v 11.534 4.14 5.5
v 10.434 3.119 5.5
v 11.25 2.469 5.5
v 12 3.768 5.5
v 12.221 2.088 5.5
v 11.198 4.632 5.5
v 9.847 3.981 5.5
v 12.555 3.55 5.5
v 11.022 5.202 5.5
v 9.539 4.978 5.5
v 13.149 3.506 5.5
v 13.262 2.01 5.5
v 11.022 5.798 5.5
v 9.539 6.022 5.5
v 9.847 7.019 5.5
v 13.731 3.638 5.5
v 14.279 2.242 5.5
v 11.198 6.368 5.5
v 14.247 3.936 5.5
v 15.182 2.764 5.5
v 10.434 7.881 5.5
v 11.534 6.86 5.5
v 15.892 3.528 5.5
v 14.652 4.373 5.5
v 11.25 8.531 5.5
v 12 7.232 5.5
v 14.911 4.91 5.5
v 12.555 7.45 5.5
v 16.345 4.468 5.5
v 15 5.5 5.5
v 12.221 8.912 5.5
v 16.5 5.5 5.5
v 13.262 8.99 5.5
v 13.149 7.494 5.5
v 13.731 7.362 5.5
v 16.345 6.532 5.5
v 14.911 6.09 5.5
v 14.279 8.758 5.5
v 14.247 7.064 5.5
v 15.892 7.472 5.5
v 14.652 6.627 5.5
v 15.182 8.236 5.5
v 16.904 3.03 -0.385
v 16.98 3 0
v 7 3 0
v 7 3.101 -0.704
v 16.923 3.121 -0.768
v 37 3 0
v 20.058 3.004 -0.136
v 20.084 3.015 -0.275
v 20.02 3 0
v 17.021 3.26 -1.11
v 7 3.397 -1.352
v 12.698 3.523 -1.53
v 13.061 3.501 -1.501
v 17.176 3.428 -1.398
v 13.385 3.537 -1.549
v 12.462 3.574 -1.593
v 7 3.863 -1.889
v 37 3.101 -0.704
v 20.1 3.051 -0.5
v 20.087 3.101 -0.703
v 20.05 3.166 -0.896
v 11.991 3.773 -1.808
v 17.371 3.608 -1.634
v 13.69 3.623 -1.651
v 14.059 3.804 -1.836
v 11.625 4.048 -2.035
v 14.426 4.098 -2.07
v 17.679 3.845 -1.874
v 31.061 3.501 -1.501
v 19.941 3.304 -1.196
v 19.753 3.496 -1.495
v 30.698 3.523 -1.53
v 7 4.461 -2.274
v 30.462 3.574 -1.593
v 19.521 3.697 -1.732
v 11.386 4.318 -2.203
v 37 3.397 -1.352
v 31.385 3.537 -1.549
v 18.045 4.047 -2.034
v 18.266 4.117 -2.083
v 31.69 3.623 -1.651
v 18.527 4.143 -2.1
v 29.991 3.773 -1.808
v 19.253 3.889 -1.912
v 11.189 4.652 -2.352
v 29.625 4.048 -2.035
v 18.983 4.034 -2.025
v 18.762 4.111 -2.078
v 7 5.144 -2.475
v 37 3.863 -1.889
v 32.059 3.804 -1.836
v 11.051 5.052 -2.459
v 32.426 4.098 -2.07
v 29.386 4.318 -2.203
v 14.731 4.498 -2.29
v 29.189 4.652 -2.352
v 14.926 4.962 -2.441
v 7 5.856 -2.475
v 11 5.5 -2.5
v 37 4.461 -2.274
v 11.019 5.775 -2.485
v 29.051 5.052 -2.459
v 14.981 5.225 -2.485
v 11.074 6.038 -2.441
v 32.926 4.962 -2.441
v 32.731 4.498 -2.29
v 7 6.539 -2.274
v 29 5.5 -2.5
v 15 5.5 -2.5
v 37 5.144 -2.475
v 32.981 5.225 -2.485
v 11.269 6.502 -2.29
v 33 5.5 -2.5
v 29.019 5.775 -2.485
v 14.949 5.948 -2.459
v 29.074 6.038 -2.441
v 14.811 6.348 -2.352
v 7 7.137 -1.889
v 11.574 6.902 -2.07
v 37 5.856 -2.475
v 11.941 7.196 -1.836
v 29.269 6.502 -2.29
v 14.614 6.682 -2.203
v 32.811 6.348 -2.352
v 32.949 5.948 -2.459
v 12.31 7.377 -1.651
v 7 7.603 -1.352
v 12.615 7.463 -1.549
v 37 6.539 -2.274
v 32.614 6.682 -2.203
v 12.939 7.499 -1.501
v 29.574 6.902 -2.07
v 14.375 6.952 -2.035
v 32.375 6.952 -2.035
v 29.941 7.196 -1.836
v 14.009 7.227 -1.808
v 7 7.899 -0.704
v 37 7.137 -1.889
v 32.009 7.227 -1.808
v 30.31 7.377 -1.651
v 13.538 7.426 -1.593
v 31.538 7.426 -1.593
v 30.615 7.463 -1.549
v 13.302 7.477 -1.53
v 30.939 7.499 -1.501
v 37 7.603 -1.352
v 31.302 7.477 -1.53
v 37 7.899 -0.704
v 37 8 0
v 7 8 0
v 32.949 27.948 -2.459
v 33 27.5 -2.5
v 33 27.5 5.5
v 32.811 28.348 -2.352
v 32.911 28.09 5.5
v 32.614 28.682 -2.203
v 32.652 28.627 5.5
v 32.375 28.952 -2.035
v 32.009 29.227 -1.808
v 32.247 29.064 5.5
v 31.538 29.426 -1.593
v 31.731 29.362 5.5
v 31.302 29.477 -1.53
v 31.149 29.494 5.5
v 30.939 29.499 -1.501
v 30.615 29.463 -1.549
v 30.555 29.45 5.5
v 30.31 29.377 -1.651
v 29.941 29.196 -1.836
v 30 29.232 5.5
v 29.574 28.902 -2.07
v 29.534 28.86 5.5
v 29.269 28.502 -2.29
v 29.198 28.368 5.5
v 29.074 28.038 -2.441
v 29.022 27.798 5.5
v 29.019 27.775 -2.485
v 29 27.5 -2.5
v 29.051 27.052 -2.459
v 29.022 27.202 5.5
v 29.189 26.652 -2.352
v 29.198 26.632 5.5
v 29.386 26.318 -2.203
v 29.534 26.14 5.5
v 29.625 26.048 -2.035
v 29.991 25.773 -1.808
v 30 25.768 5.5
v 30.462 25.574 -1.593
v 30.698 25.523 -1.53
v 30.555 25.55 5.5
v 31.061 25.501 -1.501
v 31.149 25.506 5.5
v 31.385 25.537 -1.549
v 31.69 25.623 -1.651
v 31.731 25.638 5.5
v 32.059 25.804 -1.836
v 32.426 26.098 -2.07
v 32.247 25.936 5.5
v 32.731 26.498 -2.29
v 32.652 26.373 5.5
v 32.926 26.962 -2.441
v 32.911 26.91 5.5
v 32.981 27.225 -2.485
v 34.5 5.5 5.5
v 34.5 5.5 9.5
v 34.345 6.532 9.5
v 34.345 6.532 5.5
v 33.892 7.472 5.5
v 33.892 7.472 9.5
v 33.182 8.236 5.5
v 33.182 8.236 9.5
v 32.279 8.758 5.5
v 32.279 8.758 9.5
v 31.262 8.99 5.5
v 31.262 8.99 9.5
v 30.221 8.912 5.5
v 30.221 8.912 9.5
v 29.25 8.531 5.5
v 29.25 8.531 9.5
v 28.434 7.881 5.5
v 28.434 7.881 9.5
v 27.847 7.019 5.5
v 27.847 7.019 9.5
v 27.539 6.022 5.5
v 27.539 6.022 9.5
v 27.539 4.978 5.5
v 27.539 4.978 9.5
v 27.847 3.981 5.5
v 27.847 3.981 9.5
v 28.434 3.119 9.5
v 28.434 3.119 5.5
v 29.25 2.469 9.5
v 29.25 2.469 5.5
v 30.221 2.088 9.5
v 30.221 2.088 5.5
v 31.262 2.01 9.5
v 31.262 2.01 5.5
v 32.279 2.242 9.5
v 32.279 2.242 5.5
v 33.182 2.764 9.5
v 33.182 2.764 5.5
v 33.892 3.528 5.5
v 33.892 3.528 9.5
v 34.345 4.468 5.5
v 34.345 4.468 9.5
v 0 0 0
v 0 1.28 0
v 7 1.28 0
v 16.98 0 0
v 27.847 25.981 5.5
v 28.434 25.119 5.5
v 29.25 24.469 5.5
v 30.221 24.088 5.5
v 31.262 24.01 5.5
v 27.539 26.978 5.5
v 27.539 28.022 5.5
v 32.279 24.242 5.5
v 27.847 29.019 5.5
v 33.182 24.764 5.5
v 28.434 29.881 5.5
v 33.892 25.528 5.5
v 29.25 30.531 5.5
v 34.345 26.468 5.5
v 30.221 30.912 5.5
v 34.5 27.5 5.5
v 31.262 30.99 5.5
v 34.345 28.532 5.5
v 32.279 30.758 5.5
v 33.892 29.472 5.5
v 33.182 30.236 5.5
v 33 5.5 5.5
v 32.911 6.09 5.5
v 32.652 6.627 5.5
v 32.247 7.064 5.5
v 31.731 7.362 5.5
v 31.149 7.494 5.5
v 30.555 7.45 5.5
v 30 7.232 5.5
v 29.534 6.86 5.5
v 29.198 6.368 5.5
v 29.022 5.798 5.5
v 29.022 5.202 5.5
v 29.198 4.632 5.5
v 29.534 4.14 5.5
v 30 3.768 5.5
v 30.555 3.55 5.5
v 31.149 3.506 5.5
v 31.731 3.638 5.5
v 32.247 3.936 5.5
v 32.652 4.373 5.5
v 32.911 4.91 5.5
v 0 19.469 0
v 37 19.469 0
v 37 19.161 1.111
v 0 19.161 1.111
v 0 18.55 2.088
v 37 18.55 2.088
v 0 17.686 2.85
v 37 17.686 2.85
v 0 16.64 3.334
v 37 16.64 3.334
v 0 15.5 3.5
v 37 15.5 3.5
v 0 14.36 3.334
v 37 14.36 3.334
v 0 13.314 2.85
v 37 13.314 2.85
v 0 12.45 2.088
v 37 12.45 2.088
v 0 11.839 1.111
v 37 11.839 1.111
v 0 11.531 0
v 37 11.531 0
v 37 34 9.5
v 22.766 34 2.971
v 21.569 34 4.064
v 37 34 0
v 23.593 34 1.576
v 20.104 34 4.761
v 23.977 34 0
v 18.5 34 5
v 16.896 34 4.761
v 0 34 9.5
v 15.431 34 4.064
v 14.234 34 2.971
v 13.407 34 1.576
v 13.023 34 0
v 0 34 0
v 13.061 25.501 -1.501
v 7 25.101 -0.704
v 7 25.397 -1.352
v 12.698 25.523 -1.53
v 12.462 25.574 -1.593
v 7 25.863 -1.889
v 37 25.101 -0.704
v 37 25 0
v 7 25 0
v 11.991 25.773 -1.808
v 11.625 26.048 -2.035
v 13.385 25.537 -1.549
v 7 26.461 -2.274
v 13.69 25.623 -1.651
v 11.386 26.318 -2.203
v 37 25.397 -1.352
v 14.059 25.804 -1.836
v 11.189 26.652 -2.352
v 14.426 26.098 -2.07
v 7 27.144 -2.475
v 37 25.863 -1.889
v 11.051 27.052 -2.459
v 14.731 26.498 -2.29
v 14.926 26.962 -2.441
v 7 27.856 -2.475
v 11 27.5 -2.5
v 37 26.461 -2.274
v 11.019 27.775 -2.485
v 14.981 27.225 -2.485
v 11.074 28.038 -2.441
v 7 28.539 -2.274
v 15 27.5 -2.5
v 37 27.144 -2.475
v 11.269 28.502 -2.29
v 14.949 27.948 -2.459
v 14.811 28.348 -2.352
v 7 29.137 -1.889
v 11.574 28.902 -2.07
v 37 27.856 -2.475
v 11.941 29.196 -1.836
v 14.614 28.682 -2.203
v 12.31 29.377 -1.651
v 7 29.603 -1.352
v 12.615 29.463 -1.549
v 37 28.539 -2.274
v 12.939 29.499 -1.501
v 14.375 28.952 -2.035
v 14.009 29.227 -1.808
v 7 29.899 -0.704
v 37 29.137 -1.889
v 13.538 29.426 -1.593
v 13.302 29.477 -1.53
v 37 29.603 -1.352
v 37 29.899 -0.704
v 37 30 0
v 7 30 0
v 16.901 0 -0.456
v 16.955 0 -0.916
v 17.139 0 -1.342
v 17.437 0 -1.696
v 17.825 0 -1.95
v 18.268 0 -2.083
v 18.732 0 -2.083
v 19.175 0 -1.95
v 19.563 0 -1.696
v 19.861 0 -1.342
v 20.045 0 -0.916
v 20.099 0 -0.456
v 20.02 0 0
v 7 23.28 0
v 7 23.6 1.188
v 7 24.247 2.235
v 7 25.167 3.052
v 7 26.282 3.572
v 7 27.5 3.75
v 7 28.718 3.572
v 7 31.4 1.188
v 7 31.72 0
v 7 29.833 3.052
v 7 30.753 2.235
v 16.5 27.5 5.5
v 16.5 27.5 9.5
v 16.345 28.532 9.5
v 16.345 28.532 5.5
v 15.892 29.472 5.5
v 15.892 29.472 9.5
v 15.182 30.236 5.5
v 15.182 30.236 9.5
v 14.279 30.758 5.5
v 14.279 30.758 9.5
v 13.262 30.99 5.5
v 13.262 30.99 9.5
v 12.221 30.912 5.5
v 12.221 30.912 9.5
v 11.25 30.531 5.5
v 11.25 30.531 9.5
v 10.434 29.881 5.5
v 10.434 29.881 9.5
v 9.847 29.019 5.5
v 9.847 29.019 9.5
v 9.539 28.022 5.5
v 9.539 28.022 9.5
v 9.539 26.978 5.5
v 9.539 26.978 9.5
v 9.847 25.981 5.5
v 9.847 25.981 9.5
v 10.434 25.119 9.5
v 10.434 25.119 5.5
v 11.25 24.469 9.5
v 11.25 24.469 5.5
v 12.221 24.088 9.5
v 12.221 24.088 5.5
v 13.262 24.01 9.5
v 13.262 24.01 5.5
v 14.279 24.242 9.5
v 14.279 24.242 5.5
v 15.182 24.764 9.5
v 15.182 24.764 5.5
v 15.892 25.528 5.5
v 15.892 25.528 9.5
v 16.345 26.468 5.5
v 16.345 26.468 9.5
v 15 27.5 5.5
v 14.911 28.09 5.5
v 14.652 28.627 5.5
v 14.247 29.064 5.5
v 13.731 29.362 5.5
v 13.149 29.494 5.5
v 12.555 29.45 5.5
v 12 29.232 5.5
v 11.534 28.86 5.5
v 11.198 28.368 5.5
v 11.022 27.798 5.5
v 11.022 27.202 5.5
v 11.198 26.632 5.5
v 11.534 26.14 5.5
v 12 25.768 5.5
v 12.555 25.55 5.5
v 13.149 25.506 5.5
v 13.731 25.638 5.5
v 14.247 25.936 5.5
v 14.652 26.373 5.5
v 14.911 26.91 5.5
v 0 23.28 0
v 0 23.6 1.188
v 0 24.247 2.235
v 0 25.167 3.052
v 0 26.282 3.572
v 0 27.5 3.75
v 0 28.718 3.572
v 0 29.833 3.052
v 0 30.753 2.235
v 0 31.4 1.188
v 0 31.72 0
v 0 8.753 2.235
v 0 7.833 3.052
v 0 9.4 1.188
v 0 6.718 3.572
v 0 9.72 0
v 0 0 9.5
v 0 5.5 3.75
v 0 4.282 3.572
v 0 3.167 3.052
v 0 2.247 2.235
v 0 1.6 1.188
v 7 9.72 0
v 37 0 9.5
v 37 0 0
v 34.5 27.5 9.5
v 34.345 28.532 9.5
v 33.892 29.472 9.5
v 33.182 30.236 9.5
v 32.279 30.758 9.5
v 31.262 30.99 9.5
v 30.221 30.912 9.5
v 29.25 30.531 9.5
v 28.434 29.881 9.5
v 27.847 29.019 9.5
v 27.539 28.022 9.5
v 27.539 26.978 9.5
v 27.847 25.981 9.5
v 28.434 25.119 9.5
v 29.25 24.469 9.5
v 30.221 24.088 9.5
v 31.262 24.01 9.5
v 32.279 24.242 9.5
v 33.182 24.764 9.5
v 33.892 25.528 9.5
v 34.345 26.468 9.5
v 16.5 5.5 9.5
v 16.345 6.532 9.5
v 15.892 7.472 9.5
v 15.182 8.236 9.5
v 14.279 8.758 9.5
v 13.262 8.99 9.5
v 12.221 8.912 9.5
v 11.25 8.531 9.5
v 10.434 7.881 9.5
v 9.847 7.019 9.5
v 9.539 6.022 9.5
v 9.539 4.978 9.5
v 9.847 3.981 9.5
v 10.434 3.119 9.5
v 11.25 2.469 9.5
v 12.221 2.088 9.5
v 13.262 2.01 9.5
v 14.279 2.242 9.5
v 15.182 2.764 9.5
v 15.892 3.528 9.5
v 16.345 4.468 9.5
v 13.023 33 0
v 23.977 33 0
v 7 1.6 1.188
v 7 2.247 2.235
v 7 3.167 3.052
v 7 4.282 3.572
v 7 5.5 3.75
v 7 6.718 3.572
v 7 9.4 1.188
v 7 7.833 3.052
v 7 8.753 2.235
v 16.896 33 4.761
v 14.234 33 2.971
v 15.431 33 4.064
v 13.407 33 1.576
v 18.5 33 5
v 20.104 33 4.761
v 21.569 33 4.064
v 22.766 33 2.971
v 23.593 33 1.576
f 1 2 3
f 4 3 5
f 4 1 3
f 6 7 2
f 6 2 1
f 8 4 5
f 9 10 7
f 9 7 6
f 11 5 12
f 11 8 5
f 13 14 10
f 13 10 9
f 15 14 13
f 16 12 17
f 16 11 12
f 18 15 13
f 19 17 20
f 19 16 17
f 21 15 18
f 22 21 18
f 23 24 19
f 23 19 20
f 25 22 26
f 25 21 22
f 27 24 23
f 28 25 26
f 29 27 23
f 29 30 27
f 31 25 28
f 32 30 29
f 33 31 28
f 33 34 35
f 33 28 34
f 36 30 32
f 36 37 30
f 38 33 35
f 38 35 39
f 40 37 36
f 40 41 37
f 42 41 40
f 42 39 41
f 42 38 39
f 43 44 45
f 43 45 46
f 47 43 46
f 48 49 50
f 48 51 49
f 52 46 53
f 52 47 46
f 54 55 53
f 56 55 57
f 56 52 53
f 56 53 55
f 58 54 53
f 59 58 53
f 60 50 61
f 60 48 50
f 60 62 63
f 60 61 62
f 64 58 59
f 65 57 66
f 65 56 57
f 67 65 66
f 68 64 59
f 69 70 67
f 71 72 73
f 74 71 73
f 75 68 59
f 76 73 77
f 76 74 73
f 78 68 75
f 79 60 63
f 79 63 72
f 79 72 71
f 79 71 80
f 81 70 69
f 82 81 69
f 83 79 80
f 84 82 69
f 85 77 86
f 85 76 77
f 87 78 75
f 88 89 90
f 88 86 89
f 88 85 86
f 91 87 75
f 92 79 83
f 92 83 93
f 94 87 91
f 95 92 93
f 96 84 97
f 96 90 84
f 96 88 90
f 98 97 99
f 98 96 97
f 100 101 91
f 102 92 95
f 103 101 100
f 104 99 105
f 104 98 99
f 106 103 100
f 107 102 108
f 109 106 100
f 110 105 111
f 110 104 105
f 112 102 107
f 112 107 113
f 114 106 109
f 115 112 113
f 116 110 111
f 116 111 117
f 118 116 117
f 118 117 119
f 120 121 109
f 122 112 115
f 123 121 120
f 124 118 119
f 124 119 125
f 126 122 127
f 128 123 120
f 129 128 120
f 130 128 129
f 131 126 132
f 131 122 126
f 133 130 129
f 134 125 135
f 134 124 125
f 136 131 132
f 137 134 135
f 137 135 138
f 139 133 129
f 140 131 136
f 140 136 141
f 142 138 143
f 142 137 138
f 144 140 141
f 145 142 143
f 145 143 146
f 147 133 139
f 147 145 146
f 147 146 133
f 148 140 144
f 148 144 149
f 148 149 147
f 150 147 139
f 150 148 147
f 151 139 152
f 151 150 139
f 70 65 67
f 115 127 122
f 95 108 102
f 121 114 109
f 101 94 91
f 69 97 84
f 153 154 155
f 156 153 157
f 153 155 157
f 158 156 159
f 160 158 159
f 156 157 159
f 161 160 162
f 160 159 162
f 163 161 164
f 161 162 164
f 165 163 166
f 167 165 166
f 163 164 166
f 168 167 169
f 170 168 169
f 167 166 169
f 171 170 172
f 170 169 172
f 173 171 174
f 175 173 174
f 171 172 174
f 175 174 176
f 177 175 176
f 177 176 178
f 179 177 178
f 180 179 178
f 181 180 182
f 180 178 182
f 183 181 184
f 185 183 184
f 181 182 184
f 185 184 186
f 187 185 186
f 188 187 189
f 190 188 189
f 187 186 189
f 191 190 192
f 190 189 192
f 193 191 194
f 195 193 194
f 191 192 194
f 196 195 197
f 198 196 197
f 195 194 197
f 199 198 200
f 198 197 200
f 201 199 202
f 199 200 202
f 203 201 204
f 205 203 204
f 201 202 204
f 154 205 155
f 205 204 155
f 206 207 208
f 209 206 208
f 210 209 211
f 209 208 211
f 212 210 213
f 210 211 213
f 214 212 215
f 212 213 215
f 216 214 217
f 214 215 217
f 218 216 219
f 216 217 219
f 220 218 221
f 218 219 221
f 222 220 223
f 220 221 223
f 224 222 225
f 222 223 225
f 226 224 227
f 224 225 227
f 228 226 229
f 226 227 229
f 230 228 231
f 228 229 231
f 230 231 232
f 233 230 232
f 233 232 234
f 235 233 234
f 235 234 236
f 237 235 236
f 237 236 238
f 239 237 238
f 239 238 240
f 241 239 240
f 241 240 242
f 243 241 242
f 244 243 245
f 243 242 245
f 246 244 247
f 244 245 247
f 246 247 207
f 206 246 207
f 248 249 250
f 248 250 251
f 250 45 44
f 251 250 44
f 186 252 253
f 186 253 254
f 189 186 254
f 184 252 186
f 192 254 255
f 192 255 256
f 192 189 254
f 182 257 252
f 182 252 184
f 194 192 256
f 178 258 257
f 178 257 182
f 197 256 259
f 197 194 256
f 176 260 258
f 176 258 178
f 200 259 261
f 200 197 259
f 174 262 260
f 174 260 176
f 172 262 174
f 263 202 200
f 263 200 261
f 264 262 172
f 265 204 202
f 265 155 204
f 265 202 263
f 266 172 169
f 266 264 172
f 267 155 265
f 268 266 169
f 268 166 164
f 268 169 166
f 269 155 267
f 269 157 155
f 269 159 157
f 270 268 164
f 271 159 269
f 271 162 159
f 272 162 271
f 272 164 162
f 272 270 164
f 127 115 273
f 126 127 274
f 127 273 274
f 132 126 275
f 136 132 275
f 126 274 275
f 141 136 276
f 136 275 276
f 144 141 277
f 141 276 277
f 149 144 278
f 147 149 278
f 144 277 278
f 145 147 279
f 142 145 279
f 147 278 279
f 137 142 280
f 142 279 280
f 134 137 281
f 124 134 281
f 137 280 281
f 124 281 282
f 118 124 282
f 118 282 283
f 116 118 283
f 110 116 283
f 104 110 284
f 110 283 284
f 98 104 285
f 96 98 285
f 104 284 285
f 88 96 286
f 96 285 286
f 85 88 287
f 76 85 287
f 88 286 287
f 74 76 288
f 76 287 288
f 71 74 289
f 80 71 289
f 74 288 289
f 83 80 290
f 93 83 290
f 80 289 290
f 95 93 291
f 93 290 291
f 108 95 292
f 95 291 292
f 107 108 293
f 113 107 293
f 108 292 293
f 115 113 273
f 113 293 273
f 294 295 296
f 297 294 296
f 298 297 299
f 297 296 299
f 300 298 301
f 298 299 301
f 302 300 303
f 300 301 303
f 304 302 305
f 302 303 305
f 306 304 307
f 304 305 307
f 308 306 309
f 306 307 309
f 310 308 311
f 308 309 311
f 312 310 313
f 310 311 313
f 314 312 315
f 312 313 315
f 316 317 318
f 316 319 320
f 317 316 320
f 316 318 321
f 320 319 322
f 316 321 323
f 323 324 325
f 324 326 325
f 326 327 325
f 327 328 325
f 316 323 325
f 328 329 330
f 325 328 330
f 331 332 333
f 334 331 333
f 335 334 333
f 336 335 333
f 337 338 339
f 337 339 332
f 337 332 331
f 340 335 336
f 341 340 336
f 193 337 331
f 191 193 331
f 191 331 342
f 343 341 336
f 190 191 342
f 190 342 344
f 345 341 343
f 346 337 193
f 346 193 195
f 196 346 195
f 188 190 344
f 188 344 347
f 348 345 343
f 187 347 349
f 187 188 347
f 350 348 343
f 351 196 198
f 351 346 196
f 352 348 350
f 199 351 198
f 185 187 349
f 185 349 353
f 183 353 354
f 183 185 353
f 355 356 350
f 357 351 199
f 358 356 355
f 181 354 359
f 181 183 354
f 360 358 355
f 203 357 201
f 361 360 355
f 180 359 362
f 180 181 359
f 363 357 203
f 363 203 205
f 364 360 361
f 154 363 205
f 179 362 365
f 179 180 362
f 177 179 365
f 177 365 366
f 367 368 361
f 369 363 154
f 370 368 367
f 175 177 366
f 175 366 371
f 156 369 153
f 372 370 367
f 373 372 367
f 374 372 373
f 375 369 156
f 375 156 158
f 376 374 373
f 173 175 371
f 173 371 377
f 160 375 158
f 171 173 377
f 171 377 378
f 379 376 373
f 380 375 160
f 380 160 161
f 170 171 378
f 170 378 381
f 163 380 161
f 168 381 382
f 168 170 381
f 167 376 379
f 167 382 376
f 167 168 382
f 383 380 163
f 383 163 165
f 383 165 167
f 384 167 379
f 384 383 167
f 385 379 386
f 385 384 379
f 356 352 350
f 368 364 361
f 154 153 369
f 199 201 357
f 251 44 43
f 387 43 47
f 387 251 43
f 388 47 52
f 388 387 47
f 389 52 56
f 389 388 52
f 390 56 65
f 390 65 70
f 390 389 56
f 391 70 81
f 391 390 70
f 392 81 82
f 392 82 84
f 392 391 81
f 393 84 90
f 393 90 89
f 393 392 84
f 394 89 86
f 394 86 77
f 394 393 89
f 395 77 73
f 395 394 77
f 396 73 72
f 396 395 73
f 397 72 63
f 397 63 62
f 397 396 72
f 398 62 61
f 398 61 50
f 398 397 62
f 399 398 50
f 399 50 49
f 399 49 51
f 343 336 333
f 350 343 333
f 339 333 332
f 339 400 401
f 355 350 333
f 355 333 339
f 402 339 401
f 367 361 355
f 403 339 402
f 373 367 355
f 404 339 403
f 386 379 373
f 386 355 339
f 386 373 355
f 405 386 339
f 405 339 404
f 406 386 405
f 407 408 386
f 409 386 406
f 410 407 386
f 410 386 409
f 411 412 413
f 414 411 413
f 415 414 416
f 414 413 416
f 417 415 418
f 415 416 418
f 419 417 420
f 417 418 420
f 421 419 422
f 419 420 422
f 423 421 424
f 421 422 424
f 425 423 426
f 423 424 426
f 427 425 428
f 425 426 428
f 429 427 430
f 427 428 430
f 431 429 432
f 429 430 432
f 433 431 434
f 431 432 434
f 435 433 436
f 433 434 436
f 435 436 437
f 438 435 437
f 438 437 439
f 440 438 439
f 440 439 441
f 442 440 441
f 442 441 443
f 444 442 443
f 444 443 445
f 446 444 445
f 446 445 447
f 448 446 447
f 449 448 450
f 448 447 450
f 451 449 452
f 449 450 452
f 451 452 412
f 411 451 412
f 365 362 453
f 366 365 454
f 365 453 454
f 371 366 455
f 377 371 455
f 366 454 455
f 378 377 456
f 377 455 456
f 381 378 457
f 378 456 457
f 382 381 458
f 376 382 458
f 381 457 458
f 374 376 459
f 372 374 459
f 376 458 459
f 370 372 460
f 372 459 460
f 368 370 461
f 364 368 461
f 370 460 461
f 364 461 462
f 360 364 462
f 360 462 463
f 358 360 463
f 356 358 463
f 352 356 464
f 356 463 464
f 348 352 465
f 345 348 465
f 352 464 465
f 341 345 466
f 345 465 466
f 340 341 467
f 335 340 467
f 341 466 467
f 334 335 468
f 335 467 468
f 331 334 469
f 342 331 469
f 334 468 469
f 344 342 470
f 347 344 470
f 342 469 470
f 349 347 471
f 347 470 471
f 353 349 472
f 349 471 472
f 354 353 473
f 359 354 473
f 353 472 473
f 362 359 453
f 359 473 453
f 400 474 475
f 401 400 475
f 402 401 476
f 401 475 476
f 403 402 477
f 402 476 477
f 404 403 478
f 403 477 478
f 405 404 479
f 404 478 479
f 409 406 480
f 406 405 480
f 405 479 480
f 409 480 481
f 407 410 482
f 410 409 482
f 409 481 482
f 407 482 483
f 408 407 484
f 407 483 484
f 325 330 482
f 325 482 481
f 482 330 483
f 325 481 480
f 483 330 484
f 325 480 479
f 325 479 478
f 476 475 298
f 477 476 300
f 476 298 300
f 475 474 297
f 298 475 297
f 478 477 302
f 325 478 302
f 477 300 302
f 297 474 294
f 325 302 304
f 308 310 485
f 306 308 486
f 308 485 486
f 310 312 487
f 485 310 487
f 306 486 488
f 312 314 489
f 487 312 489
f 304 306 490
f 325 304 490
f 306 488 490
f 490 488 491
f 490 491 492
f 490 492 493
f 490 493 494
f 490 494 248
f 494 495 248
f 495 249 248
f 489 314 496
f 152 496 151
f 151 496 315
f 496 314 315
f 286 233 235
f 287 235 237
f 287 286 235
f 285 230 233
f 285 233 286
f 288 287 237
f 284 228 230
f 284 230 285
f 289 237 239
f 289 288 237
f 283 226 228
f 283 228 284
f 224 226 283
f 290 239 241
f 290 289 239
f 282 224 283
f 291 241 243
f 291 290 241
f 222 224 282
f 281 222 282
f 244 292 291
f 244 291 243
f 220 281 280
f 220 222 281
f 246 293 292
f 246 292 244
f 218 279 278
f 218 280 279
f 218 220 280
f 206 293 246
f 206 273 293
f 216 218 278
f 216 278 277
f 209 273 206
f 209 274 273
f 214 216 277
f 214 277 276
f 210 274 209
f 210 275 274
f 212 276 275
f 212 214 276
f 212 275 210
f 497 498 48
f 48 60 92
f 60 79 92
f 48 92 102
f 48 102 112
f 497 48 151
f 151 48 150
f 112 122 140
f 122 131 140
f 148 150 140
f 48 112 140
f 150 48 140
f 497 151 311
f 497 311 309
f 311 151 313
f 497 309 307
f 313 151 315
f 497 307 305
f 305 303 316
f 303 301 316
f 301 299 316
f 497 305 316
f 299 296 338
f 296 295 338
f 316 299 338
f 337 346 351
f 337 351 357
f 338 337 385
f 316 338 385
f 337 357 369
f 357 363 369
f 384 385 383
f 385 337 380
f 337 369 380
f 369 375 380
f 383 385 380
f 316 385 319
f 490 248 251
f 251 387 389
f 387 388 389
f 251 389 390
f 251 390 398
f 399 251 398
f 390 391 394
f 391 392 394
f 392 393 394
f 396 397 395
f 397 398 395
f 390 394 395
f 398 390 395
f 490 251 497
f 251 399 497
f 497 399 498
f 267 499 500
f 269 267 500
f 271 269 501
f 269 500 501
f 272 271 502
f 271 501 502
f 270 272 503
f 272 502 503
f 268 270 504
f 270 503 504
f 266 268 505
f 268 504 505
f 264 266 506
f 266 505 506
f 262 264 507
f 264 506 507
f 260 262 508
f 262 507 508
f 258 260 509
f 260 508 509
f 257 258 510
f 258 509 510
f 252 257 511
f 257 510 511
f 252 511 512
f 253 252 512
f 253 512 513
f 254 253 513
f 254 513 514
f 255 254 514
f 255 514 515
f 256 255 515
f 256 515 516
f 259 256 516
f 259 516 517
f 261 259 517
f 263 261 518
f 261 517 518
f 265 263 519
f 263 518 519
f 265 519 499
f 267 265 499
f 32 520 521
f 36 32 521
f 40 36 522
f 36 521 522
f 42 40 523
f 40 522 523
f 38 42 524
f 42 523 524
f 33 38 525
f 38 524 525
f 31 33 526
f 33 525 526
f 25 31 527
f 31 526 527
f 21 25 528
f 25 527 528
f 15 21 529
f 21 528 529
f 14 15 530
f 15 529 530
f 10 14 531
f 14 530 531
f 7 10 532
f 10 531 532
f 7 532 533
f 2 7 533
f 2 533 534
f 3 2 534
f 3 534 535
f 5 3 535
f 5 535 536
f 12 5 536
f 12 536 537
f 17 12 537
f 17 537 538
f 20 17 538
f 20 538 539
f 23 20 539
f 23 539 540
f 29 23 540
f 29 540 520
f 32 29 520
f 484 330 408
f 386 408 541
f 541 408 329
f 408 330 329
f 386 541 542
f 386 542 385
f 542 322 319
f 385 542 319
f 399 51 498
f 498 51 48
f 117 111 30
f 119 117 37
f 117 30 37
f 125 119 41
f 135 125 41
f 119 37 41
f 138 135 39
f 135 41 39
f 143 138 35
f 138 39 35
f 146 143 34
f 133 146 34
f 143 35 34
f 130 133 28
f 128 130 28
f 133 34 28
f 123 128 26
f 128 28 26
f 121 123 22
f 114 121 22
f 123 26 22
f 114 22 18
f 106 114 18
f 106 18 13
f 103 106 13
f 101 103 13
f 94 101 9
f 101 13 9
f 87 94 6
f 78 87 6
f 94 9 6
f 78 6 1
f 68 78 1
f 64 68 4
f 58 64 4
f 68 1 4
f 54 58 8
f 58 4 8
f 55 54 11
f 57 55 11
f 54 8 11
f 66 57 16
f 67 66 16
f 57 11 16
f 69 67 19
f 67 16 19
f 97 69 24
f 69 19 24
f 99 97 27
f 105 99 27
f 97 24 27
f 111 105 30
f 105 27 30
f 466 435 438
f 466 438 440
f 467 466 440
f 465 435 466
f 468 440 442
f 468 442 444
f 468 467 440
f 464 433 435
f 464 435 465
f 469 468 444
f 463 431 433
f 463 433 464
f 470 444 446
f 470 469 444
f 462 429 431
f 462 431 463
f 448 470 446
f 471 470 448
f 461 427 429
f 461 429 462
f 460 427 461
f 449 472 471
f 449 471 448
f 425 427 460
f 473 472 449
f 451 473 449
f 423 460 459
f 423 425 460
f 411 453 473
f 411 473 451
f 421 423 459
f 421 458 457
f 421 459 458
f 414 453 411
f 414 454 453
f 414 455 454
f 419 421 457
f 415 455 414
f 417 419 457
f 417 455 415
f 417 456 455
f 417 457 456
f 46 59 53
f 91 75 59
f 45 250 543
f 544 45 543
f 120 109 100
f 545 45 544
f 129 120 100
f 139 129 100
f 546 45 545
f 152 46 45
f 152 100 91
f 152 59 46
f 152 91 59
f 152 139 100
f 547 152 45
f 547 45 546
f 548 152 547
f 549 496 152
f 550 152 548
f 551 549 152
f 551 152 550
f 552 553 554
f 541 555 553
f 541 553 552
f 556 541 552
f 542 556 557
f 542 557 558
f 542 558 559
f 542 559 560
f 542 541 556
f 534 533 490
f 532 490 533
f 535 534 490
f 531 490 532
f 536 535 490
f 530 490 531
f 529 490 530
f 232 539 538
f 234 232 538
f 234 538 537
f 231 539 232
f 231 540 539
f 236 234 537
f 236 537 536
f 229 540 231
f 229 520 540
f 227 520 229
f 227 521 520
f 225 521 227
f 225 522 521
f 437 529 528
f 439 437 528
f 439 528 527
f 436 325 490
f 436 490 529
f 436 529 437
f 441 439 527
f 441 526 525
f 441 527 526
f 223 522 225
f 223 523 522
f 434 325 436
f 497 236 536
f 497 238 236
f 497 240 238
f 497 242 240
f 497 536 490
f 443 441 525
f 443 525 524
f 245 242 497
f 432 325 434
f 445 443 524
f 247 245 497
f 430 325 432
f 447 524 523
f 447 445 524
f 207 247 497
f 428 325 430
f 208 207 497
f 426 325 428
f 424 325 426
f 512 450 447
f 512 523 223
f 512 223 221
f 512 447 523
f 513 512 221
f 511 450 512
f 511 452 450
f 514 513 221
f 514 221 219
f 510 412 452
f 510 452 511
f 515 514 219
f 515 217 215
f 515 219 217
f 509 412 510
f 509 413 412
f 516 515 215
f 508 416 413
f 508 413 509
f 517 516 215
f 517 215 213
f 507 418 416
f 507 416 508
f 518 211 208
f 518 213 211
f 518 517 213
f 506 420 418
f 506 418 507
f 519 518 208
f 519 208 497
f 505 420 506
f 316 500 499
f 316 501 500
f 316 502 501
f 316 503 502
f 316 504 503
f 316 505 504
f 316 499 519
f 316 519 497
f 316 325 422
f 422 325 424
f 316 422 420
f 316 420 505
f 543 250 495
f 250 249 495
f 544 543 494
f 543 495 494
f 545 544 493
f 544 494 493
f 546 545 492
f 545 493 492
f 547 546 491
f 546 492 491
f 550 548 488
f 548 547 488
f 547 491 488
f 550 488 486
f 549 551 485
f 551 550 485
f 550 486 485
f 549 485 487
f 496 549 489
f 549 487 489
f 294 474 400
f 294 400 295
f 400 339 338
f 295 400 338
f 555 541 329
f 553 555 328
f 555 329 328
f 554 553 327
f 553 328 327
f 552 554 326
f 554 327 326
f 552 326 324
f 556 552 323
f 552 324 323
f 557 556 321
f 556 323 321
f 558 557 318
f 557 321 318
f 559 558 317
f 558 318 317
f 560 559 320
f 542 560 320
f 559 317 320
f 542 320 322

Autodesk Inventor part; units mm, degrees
ref_plane "YZ Plane" through (0, 0, 0) normal (1, 0, 0) x (0, 1, 0)
ref_plane "XZ Plane" through (0, 0, 0) normal (0, 1, 0) x (-1, 0, 0)
ref_plane "XY Plane" through (0, 0, 0) normal (0, 0, 1) x (1, 0, 0)
sketch "Sketch1" plane through (0, 0, 0) normal (0, 0, 1) x (1, 0, 0)
  line L0 (0, 0) -> (37, 0)
  line L1 (37, 0) -> (37, 34)
  line L2 (37, 34) -> (0, 34)
  line L3 (0, 34) -> (0, 0)
  dimension "d0" = 37
  dimension "d1" = 34
extrude "Extrusion1" add sketch "Sketch1" along normal blind 9.5
sketch "Sketch2" plane through (37, 0, 0) normal (1, 0, 0) x (0, 0, -1)
  line L0 (0, 0) -> (0, 34) projected
  line L1 (0, 0) -> (-9.5, 0) projected
  circle A0 centre (0.5, 15.5) radius 4
  dimension "d4" = 8
  dimension "d5" = 15.5
  dimension "d6" = 0.5
extrude "Extrusion2" cut sketch "Sketch2" against normal up to surface (37 mm away)
sketch "Sketch4" plane through (37, 0, 9.5) normal (1, 0, 0) x (0, 0, -1)
  line L0 (9.5, 19.4686) -> (9.5, 34) projected
  line L1 (9.5, 0) -> (0, 0) projected
  line L2 (9.5, 0) -> (9.5, 11.5314) projected
  circle A0 centre (9.5, 27.5) radius 2.5
  circle A1 centre (9.5, 5.5) radius 2.5
  dimension "d19" = 5
  dimension "d20" = 5
  dimension "d21" = 5.5
  dimension "d45" = 27.5
extrude "Extrusion4" add sketch "Sketch4" against normal blind 30
sketch "Sketch3" plane through (0, 0, 9.5) normal (0, 0, 1) x (1, 0, 0)
  line L0 (0, 0) -> (37, 0) projected
  line L1 (37, 0) -> (37, 34) projected
  circle A0 centre (31, 5.5) radius 2
  circle A1 centre (31, 27.5) radius 2
  circle A2 centre (13, 5.5) radius 2
  circle A3 centre (13, 27.5) radius 2
  dimension "d9" = 4
  dimension "d10" = 6
  dimension "d11" = 5.5
  dimension "d12" = 27.5
  dimension "d13" = 4
  dimension "d15" = 24
  dimension "d16" = 4
extrude "Extrusion3" cut sketch "Sketch3" against normal up to next
sketch "Sketch5" plane through (0, 0, 9.5) normal (-1, 0, 0) x (0, 0, 1)
  line L0 (-9.5, 11.5314) -> (-9.5, 0) projected
  line L1 (-9.5, 0) -> (0, 0) projected
  circle A0 centre (-10, 27.5) radius 4.25
  circle A1 centre (-10, 5.5) radius 4.25
  dimension "d25" = 8.5
  dimension "d26" = 8.5
  dimension "d27" = 0.5
  dimension "d28" = 5.5
  dimension "d46" = 27.5
extrude "Extrusion5" cut sketch "Sketch5" against normal blind 7
sketch "Sketch6" plane through (0, 34, 0) normal (0, 1, 0) x (1, 0, 0)
  line L0 (37, 0) -> (0, 0) projected
  line L1 (37, 0) -> (37, -9.5) projected
  circle A0 centre (18.5, 0.5) radius 5.5
  dimension "d32" = 11
  dimension "d33" = 0.5
  dimension "d34" = 18.5
extrude "Extrusion6" cut sketch "Sketch6" against normal blind 1
sketch "Sketch7" plane through (0, 0, 0) normal (0, -1, 0) x (1, 0, 0)
  line L0 (0, 0) -> (37, 0) projected
  line L1 (37, 0) -> (37, 9.5) projected
  circle A0 centre (18.5, -0.5) radius 1.6
  dimension "d37" = 3.2
  dimension "d38" = 0.5
  dimension "d39" = 18.5
extrude "Extrusion7" add sketch "Sketch7" against normal blind 6
sketch "Sketch8" plane through (0, 0, 9.5) normal (0, 0, 1) x (1, 0, 0)
  circle A0 centre (13, 5.5) radius 2 projected
  circle A1 centre (31, 5.5) radius 2 projected
  circle A2 centre (31, 27.5) radius 2 projected
  circle A3 centre (13, 27.5) radius 2 projected
  circle A4 centre (13, 27.5) radius 3.5
  circle A5 centre (31, 27.5) radius 3.5
  circle A6 centre (31, 5.5) radius 3.5
  circle A7 centre (13, 5.5) radius 3.5
  dimension "d42" = 7
extrude "Extrusion8" cut sketch "Sketch8" against normal blind 4
properties part number "YAxisMotorCap" material "ABS Plastic"
